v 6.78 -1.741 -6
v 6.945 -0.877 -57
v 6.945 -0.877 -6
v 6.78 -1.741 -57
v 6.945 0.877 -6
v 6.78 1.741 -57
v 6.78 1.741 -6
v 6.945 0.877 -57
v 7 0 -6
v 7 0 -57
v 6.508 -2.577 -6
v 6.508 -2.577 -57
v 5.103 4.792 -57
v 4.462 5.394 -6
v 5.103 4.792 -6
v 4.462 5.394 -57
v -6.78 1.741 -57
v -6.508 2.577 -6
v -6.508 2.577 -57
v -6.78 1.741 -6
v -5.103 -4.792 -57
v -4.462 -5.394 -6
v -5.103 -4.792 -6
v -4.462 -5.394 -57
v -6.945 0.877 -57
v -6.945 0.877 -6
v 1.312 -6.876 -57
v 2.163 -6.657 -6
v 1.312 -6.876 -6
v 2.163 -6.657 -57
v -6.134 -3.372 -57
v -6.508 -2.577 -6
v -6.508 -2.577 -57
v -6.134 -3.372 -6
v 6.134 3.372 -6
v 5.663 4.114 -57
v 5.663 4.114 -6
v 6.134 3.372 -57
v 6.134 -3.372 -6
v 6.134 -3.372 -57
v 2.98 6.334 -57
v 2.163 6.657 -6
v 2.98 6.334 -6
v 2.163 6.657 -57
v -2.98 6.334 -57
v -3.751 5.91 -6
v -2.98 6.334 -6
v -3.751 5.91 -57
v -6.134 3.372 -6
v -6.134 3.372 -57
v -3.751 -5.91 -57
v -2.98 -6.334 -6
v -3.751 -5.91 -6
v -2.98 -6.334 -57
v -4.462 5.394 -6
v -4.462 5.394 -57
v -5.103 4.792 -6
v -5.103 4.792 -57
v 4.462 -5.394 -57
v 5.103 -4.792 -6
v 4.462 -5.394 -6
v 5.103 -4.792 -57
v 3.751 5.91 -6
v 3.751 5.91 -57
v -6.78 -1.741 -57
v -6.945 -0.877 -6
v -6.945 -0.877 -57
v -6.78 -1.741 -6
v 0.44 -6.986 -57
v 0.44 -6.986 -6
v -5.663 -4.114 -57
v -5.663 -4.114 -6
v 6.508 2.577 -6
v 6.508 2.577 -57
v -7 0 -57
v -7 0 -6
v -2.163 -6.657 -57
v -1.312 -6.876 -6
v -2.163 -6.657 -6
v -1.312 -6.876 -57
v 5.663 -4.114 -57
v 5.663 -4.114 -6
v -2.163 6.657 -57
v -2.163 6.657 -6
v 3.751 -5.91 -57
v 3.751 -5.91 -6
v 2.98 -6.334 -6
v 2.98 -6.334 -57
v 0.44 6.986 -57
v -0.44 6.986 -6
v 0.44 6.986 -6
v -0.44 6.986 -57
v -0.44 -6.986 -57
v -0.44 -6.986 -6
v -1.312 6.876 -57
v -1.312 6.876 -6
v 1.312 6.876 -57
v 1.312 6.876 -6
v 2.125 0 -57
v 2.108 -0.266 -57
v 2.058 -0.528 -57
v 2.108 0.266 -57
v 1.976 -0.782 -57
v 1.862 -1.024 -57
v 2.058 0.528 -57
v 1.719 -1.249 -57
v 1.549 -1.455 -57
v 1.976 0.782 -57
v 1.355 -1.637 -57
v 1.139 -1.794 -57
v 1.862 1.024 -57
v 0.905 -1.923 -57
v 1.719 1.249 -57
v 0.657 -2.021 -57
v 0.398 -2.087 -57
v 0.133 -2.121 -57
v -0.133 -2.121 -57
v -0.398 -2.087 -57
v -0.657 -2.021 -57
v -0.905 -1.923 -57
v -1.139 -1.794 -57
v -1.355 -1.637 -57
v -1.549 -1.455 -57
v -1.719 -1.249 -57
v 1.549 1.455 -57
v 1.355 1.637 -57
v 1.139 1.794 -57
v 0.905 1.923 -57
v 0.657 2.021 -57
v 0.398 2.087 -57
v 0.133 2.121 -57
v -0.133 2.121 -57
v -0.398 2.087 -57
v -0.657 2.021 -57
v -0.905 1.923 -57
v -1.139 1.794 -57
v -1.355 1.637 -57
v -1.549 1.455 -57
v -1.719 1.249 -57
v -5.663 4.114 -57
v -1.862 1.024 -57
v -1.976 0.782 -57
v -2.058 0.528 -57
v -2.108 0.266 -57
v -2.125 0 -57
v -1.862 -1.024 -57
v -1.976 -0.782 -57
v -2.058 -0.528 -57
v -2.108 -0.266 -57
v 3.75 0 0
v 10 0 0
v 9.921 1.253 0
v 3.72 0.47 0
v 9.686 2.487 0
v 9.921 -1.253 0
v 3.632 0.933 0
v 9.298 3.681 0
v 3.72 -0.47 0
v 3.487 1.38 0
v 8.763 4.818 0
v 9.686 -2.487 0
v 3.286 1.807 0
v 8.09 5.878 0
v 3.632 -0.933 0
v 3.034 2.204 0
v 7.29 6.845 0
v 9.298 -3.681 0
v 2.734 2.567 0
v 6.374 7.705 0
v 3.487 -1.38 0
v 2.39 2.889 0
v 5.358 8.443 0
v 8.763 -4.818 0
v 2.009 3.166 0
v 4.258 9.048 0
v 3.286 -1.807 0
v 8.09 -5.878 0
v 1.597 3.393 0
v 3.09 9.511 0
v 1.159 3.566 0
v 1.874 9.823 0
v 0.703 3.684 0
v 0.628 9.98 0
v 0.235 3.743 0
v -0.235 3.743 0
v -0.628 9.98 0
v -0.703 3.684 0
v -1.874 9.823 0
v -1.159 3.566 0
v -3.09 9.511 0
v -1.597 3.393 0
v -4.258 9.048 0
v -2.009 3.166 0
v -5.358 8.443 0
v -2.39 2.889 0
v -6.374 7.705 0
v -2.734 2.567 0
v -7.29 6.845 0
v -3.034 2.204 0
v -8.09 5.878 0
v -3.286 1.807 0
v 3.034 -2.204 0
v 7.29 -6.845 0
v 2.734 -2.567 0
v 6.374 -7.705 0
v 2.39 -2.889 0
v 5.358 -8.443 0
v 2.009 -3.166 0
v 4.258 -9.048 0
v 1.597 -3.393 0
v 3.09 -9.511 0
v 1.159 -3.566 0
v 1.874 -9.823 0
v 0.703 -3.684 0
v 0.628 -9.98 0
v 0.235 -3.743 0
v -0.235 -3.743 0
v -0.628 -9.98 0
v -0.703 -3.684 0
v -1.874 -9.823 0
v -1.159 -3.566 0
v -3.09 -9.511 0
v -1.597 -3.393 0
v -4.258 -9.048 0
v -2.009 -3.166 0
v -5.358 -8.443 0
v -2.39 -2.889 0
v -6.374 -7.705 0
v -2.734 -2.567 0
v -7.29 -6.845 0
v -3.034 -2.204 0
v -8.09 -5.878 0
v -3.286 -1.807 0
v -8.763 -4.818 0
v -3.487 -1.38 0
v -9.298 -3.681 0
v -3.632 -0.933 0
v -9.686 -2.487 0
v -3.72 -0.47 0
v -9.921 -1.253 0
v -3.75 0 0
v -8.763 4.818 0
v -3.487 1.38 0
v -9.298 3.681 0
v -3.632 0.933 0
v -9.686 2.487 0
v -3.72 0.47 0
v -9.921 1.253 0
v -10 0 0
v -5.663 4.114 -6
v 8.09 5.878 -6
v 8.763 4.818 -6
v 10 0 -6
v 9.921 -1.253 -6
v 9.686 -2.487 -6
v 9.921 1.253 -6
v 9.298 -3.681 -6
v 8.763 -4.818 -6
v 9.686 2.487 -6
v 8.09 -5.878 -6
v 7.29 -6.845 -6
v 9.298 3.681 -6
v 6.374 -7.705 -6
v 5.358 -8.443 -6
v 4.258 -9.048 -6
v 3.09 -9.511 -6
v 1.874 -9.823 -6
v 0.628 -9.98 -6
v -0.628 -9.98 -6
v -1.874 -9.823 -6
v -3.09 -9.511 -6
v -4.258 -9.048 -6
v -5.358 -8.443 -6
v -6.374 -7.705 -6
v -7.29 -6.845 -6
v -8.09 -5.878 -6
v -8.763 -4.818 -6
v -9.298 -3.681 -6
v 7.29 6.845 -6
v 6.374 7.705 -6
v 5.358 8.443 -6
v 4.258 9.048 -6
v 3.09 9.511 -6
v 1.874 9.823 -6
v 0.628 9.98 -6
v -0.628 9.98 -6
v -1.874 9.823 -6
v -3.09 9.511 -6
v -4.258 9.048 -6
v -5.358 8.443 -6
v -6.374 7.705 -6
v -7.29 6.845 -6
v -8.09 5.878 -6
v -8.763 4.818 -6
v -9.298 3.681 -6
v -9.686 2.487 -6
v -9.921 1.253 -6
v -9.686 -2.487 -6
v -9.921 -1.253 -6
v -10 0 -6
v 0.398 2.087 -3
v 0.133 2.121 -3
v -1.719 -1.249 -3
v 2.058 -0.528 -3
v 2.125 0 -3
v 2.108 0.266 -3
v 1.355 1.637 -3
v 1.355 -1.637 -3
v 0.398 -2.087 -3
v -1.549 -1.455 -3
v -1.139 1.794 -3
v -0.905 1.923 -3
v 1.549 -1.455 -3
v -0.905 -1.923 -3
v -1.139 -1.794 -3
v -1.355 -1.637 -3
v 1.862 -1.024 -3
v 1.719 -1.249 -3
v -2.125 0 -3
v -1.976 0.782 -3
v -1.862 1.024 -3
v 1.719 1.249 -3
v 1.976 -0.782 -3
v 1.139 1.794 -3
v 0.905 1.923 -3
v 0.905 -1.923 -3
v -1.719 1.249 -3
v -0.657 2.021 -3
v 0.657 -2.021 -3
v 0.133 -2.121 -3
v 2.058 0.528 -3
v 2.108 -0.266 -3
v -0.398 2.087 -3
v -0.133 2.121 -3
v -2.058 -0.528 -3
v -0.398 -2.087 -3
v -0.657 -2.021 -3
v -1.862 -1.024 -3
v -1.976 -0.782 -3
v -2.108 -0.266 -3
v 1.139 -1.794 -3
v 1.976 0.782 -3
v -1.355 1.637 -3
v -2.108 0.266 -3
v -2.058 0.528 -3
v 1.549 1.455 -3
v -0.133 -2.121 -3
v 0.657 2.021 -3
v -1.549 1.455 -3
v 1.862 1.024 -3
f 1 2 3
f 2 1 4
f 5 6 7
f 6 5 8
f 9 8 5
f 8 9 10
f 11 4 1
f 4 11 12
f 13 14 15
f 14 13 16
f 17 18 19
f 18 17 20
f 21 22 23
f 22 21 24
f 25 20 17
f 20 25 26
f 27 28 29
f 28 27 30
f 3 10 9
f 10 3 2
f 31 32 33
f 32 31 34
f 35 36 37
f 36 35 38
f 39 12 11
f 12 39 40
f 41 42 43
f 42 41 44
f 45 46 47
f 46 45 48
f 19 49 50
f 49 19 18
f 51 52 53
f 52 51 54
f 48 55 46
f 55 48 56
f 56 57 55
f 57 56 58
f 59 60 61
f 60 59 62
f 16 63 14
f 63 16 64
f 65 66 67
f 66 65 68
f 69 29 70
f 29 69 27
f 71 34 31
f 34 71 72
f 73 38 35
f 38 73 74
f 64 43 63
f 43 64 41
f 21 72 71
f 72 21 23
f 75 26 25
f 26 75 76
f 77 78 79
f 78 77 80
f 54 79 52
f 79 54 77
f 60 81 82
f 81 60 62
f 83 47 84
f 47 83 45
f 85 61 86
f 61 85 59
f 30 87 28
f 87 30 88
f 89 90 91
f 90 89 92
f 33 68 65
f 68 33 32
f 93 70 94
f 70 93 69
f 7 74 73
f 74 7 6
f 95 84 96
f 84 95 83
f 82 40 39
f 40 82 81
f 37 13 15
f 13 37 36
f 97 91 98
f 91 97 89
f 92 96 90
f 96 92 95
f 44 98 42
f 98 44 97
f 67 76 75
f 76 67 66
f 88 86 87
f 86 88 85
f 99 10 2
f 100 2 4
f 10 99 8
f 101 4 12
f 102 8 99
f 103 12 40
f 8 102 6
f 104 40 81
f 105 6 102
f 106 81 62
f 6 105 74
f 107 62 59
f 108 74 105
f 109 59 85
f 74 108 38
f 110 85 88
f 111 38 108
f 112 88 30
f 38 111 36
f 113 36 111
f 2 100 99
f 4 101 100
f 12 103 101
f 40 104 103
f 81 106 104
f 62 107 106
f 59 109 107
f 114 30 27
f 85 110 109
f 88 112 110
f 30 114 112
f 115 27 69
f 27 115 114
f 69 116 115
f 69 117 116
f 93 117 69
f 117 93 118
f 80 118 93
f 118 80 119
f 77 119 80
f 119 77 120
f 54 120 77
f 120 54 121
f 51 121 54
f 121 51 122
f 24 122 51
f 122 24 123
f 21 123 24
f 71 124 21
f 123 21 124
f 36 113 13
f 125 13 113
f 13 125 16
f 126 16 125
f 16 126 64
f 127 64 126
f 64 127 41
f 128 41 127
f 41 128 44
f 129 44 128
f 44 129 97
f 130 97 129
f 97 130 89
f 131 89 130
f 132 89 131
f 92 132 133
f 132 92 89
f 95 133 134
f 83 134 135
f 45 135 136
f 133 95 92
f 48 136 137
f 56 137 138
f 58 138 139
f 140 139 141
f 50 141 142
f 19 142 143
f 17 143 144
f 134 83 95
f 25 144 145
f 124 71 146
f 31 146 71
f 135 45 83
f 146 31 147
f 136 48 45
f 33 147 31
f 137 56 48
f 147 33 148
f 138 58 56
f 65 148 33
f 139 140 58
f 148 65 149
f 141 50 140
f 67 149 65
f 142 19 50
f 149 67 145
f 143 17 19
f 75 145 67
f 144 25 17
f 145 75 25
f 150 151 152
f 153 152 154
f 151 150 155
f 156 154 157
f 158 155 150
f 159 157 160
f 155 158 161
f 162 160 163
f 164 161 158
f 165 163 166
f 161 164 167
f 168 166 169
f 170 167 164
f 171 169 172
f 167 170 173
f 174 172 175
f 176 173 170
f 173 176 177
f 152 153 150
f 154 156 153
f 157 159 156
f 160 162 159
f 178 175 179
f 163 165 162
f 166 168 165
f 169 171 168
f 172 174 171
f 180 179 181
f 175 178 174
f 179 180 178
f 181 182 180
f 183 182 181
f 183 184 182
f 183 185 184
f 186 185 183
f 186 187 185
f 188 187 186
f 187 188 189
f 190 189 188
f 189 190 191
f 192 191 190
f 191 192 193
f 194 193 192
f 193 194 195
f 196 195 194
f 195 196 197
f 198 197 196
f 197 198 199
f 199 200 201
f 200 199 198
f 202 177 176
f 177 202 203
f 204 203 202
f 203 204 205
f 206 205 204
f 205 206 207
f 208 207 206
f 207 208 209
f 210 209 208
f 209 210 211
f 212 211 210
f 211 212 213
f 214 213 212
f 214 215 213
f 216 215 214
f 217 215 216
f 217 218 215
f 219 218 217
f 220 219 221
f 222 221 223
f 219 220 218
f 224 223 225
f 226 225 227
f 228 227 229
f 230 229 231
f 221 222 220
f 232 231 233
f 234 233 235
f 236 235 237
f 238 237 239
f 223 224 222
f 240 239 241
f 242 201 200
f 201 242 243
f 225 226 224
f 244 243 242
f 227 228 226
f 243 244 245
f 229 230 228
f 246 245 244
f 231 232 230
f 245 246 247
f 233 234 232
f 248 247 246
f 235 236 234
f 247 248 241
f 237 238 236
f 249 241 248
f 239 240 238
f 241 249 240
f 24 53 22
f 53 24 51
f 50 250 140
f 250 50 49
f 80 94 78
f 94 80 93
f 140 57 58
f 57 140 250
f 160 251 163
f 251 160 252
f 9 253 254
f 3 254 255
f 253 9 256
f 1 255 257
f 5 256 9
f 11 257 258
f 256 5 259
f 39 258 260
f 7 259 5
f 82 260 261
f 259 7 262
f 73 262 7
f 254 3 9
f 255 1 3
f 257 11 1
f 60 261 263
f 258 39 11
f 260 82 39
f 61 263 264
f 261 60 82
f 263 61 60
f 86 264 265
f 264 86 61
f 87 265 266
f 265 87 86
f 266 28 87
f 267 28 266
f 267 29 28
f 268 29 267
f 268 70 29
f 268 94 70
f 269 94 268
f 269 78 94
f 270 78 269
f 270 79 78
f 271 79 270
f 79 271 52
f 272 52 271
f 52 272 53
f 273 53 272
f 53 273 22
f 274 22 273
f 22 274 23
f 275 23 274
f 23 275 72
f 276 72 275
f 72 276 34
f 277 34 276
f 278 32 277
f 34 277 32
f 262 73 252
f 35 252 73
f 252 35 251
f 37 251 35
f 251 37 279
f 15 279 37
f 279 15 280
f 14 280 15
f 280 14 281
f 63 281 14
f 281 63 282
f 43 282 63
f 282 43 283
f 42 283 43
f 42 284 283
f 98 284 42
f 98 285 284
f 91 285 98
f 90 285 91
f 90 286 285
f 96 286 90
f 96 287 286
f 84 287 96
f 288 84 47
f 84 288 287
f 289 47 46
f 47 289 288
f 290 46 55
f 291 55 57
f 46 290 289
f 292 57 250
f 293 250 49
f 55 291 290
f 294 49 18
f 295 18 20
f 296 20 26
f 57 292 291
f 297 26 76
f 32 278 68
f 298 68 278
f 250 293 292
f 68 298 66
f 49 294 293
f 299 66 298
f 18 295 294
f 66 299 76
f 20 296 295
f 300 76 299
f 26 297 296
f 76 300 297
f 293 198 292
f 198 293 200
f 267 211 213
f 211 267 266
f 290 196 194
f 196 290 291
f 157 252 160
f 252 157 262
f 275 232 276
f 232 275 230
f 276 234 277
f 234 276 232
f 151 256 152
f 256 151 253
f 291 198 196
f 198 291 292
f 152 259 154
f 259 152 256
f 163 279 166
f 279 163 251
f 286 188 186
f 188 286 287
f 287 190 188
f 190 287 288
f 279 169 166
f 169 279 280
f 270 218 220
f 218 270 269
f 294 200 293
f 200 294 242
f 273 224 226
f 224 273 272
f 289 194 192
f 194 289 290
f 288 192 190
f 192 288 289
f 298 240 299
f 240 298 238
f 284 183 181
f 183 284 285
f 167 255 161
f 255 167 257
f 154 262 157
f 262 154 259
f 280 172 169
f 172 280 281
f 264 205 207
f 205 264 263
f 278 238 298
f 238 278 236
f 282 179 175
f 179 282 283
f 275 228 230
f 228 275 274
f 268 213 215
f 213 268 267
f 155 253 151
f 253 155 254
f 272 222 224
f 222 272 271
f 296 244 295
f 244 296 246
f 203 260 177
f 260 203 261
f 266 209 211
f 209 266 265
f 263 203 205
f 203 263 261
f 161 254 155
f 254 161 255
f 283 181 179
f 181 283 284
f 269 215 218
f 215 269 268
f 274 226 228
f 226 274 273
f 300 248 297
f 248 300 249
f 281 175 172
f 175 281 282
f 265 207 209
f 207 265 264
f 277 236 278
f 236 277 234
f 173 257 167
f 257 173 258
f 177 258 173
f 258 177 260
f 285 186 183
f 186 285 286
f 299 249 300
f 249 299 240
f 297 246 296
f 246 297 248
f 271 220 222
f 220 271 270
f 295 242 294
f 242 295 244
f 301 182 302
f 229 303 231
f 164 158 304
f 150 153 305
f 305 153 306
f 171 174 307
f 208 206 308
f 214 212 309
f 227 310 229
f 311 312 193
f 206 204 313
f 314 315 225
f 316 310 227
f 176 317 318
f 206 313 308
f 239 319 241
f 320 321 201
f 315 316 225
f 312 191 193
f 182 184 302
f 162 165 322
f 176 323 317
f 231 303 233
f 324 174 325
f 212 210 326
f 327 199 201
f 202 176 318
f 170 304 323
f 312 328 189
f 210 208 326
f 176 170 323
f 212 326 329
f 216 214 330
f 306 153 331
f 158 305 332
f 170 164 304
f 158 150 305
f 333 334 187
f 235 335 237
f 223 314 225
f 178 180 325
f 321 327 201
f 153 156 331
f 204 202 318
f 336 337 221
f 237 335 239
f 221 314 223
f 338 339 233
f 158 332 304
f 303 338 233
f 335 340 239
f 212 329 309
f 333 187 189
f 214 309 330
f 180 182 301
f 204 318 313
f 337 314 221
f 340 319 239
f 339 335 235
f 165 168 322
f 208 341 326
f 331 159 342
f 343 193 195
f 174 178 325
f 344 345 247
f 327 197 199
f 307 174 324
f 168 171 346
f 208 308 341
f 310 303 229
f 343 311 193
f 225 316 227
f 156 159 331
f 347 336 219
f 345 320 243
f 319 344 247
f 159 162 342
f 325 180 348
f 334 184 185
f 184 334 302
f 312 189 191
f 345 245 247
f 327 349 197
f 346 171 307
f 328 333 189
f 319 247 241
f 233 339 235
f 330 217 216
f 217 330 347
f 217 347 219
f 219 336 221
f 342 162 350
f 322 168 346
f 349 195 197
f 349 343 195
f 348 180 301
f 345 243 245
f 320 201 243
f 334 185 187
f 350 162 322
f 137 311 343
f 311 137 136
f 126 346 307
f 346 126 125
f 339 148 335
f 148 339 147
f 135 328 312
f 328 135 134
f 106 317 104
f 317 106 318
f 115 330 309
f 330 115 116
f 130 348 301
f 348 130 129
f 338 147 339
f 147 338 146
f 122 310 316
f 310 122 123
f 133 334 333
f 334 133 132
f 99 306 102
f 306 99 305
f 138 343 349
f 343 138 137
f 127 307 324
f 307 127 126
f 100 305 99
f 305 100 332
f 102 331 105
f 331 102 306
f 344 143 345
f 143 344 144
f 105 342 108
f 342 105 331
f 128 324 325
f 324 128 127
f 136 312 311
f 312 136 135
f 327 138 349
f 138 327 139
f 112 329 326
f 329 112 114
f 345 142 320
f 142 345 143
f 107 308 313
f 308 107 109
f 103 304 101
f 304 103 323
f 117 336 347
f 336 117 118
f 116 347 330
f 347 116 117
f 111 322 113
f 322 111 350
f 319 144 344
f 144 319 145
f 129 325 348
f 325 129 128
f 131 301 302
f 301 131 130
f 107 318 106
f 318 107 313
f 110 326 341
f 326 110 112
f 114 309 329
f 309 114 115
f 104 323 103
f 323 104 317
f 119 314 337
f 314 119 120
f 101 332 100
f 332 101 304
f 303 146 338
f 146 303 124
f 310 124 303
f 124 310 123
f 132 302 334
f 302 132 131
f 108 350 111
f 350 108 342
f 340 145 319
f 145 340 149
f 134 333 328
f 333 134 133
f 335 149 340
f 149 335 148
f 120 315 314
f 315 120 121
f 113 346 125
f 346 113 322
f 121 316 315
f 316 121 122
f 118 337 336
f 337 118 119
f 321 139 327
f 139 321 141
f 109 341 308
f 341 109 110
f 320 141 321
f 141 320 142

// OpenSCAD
$fn = 50;


difference() {
	union() {
		translate(v = [0, 0, -57.0000000000]) {
			cylinder(h = 57, r = 7.0000000000);
		}
		translate(v = [0, 0, -6.0000000000]) {
			cylinder(h = 6, r = 10.0000000000);
		}
	}
	union() {
		translate(v = [0, 0, 0]) {
			rotate(a = [0, 0, 0]) {
				difference() {
					union() {
						#translate(v = [0, 0, -57.0000000000]) {
							cylinder(h = 57, r = 2.0000000000);
						}
						#translate(v = [0, 0, -3]) {
							cylinder(h = 3, r = 7.0000000000, r1 = 2.1250000000, r2 = 3.7500000000);
						}
						#translate(v = [0, 0, -57.0000000000]) {
							cylinder(h = 57, r = 2.1250000000);
						}
						#translate(v = [0, 0, -57.0000000000]) {
							cylinder(h = 57, r = 2.0000000000);
						}
					}
					union();
				}
			}
		}
	}
}
